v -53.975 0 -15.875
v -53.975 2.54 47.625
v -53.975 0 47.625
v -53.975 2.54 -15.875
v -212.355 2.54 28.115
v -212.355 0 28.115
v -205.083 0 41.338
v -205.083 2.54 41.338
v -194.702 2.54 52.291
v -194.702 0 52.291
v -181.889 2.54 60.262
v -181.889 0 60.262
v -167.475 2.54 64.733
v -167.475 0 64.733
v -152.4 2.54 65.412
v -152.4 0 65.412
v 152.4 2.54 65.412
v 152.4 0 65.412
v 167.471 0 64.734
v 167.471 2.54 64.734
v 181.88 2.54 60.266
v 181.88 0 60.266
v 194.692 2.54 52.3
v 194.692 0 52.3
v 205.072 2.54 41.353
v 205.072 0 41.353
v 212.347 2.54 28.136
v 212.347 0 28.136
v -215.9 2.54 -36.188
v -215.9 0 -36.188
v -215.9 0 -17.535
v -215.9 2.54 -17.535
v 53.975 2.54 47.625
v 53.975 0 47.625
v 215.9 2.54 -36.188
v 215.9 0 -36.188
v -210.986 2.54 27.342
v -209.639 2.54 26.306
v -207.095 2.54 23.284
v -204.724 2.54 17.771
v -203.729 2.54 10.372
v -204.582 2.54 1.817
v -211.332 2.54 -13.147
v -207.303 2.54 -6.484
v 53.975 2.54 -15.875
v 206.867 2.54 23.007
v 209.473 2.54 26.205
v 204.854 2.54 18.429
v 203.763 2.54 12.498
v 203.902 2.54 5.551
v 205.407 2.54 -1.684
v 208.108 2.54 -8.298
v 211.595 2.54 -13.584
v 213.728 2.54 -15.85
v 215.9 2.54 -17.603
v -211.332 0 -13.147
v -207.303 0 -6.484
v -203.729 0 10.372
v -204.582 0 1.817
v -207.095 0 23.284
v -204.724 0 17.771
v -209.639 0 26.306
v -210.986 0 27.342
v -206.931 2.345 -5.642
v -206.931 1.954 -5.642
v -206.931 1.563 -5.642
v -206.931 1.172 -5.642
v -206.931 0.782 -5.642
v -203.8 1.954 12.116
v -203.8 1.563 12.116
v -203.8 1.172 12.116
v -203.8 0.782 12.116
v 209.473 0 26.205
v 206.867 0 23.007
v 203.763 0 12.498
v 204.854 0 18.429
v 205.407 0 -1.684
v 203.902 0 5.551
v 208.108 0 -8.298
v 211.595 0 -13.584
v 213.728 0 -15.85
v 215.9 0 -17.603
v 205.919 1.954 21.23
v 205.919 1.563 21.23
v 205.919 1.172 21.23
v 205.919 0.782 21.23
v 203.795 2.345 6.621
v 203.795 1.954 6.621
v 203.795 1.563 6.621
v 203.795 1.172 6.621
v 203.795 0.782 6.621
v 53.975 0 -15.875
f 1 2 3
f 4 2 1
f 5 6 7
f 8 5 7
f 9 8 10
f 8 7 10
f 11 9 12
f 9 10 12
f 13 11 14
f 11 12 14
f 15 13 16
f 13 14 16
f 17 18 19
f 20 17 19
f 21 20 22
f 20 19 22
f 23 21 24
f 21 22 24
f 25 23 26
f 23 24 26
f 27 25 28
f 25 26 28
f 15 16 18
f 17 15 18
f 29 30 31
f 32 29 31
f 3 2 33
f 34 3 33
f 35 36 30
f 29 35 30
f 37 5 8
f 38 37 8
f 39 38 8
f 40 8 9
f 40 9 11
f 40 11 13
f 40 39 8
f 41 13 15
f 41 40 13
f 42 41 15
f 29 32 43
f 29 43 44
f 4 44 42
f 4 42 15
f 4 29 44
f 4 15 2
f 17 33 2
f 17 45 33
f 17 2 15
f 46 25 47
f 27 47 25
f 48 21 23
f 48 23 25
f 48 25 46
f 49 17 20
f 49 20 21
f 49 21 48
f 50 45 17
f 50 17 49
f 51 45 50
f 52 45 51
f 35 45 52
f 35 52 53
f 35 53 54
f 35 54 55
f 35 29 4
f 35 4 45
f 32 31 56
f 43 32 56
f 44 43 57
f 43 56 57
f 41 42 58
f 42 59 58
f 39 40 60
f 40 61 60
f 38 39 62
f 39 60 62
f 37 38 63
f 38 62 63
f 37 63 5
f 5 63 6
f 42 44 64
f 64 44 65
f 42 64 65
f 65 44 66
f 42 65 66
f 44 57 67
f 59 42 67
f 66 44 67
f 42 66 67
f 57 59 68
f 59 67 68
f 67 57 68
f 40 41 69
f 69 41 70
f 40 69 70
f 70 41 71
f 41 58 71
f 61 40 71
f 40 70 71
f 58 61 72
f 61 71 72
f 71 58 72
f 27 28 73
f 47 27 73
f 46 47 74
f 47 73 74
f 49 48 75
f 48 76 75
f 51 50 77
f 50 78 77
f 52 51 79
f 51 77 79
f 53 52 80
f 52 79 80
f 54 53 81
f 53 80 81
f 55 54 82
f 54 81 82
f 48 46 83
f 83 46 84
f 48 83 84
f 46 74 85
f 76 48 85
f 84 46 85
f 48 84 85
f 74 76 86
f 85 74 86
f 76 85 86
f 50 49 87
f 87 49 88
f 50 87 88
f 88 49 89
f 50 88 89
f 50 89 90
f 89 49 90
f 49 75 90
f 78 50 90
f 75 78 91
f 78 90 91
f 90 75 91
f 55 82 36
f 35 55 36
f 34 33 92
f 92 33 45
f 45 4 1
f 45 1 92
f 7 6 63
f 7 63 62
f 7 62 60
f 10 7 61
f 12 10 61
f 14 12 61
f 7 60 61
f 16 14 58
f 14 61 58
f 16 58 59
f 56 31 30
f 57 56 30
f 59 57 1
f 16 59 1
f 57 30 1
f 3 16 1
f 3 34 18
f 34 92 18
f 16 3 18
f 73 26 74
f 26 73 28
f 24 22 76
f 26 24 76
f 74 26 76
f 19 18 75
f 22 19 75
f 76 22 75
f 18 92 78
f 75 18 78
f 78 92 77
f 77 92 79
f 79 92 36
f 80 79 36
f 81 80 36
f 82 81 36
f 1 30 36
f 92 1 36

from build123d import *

# Parameters (mm, degrees)
BOSS_EXTRUDE1_DEPTH = 2.54
SKETCH2_W           = 107.95
SKETCH2_H           = 63.5
CUT_EXTRUDE1_DEPTH  = 226.664855764
CUT_EXTRUDE2_START  = -2.54
CUT_EXTRUDE2_DEPTH  = 2.54


# Read off the part's stored shape, not the designer's step: Cut-Extrude2
with BuildPart() as part:
    # Sketch1 → Boss-Extrude1 (new body)
    with BuildSketch(Plane(origin=(0, 0, 0), x_dir=(1, 0, 0), z_dir=(0, 1, 0))):
        with BuildLine():
            Line((215.9, -14.612459999), (215.9, 36.187540001))
            Line((215.9, 36.187540001), (-215.9, 36.187540001))
            Line((-215.9, 36.187540001), (-215.9, -14.612459999))
            ThreePointArc((-215.9, -14.612459999), (-194.259204241, -52.648965299), (-152.4, -65.412459999))
            Line((-152.4, -65.412459999), (152.4, -65.412459999))
            ThreePointArc((152.4, -65.412459999), (194.259204241, -52.648965299), (215.9, -14.612459999))
        make_face()
    extrude(amount=BOSS_EXTRUDE1_DEPTH)

    # Sketch2 → Cut-Extrude1 (cut, through all)
    with BuildSketch(Plane(origin=(0, 2.54, 0), x_dir=(1, 0, 0), z_dir=(0, 1, 0))):
        with Locations((0, -15.875)):
            Rectangle(SKETCH2_W, SKETCH2_H)
    extrude(amount=-CUT_EXTRUDE1_DEPTH, mode=Mode.SUBTRACT)

    # Cut-Extrude2 outline → Cut-Extrude2 (cut)
    with BuildSketch(Plane(origin=(0, 2.54, 0), x_dir=(1, 0, 0), z_dir=(0, 1, 0)).offset(CUT_EXTRUDE2_START)):
        with BuildLine():
            add(Edge.make_bspline(
                [(-215.899999994, 17.535115527), (-215.566109371, 17.300913161), (-214.20332449, 16.275815014), (-211.81883724, 13.954885046), (-208.930212321, 9.901978384), (-206.463783195, 4.892933776), (-204.667192604, -0.774398824), (-203.719076257, -6.643595697), (-203.665482888, -12.226688771), (-204.419435916, -17.146217321), (-205.817811739, -21.205445303), (-207.685847242, -24.362515926), (-209.864985661, -26.655137817), (-211.469591298, -27.686917669), (-212.297814145, -28.088227647), (-212.355105742, -28.115375011)],
                knots=[0.114839475, 0.114839475, 0.114839475, 0.114839475, 0.125, 0.15625, 0.1875, 0.21875, 0.25, 0.28125, 0.3125, 0.34375, 0.375, 0.40625, 0.4375, 0.46875, 0.471073894, 0.471073894, 0.471073894, 0.471073894], degree=3))
            Line((-215.899999994, 17.535115527), (-215.9, -14.612459999))
            ThreePointArc((-215.9, -14.612459999), (-214.527170136, -21.468828255), (-212.355105742, -28.115375011))
        make_face()
        with BuildLine():
            add(Edge.make_bspline(
                [(212.34685517, -28.136325182), (212.279954773, -28.104999749), (211.441572028, -27.702034349), (209.825715206, -26.66689516), (207.64277821, -24.378244073), (205.76942942, -21.224763186), (204.364219868, -17.16852613), (203.602011314, -12.251147017), (203.646262202, -6.669088999), (204.584578872, -0.799601085), (206.371728131, 4.869386838), (208.829838854, 9.881274858), (211.711764265, 13.937884913), (214.130027538, 16.298772476), (215.528958726, 17.345764848), (215.899999994, 17.602596054)],
                knots=[0.028537672, 0.028537672, 0.028537672, 0.028537672, 0.03125, 0.0625, 0.09375, 0.125, 0.15625, 0.1875, 0.21875, 0.25, 0.28125, 0.3125, 0.34375, 0.375, 0.386307936, 0.386307936, 0.386307936, 0.386307936], degree=3))
            ThreePointArc((212.34685517, -28.136325182), (214.524310397, -21.479717116), (215.9, -14.612459999))
            Line((215.9, -14.612459999), (215.899999994, 17.602596054))
        make_face()
    extrude(amount=CUT_EXTRUDE2_DEPTH, mode=Mode.SUBTRACT)


solid = part.part
